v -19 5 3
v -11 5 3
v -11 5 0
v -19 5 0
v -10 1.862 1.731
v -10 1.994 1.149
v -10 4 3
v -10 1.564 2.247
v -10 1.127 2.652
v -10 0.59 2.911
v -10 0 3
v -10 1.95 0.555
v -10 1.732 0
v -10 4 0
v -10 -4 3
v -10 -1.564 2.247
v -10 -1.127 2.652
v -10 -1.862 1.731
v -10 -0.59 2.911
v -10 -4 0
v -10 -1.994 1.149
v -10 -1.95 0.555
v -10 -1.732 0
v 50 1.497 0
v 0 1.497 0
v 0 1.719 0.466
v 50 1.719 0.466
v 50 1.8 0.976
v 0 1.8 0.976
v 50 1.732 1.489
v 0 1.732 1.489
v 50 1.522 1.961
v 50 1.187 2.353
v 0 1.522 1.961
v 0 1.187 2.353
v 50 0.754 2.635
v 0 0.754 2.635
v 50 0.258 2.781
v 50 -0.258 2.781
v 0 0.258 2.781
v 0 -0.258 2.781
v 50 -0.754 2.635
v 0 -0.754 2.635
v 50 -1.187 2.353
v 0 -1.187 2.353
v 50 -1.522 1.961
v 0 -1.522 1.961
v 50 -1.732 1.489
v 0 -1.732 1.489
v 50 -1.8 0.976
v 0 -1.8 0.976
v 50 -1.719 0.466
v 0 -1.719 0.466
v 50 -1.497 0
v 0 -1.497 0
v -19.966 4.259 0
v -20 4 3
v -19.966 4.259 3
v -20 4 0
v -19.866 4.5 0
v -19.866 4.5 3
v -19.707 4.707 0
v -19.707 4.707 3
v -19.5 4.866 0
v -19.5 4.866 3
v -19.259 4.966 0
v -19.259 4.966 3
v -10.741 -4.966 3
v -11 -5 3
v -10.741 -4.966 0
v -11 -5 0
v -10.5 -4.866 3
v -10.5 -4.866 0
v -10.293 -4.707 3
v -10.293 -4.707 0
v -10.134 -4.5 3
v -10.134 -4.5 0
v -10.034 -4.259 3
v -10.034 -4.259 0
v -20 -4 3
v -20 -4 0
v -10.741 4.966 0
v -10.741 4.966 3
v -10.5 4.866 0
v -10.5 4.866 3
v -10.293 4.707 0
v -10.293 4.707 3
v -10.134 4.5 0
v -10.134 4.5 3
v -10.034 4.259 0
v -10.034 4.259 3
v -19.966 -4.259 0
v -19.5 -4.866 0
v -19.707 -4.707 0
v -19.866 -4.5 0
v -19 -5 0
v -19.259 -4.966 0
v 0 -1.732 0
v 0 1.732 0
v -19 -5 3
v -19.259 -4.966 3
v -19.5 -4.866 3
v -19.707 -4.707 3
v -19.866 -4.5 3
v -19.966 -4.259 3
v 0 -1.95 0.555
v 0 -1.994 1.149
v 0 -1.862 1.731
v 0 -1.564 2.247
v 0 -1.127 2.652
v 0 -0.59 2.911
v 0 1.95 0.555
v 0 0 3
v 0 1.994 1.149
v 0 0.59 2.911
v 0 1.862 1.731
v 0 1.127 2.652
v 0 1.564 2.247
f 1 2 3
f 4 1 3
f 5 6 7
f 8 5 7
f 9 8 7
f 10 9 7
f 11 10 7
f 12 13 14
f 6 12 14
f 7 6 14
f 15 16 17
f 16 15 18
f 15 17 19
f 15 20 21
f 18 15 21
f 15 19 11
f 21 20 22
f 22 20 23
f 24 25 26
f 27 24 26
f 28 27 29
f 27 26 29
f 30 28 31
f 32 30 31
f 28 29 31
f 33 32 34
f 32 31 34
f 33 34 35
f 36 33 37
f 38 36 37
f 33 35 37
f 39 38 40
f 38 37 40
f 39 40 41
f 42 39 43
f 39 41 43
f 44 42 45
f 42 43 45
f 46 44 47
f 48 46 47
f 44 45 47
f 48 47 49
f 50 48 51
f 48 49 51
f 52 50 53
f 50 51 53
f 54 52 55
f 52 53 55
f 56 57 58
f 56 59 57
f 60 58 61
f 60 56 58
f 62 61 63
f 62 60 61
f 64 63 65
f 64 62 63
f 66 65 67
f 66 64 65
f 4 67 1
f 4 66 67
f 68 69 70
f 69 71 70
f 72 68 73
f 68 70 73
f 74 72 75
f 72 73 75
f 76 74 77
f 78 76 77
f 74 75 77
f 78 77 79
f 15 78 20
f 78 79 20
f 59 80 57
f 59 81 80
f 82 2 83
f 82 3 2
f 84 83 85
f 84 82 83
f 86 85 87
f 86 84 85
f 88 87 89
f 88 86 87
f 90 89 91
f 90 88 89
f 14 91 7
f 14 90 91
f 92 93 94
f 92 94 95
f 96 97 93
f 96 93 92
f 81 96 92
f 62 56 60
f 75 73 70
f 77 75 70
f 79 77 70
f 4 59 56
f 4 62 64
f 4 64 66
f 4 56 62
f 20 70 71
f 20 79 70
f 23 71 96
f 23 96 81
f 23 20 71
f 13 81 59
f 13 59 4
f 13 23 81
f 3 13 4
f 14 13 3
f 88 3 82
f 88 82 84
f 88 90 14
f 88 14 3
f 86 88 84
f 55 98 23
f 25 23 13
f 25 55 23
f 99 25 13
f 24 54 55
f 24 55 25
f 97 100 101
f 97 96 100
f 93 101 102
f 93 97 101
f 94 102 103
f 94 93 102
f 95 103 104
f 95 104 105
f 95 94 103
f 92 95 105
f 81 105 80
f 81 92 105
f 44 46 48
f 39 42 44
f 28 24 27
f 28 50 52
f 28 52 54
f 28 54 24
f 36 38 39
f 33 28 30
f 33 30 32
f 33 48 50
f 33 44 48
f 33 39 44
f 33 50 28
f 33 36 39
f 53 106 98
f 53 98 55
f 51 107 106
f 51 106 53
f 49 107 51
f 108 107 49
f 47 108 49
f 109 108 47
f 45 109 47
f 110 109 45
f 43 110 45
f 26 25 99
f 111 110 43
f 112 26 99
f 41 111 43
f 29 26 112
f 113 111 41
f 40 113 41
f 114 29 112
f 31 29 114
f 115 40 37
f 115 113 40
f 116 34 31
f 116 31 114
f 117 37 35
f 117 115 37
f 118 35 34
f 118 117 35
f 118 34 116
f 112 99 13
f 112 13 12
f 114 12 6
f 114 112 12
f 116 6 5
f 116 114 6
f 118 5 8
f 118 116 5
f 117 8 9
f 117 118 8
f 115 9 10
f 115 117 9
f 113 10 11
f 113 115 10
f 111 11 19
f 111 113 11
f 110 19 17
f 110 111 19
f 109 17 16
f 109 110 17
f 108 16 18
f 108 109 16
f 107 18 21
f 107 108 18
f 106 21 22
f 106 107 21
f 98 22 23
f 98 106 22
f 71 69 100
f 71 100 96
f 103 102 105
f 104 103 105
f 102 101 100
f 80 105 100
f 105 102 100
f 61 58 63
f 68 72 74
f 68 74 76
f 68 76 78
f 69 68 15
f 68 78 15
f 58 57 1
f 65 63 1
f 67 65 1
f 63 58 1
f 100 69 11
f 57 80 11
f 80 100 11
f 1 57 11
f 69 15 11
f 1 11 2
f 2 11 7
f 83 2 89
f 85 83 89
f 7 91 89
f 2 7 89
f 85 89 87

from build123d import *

# Parameters (mm, degrees)
PAD_DEPTH    = 50
PAD001_DEPTH = 10
SKETCH004_W  = 10
SKETCH004_H  = 3
PAD002_DEPTH = 10
FILLET_R     = 1


with BuildPart() as part:
    # Sketch → Pad (new body)
    with BuildSketch(Plane.YZ):
        with BuildLine():
            ThreePointArc((1.496663, 0), (0, 2.8), (-1.496663, 0))
            Line((-1.496663, 0), (1.496663, 0))
        make_face()
    extrude(amount=PAD_DEPTH)

    # Sketch003 → Pad001 (join)
    with BuildSketch(Plane.YZ):
        with BuildLine():
            ThreePointArc((1.732051, 0), (0, 3), (-1.732051, 0))
            Line((-1.732051, 0), (1.732051, 0))
        make_face()
    extrude(amount=-PAD001_DEPTH)

    # Sketch004 (on DatumPlane) → Pad002 (join)
    with BuildSketch(Plane(origin=(-10, 0, 0), x_dir=(0, 1, 0), z_dir=(-1, 0, 0))):
        with Locations((0, -1.5)):
            Rectangle(SKETCH004_W, SKETCH004_H)
    extrude(amount=PAD002_DEPTH)

    # Fillet
    fillet_edges = [part.edges().sort_by_distance(p)[0] for p in [
        (-20, 5, 1.5),
        (-10, 5, 1.5),
        (-10, -5, 1.5),
        (-20, -5, 1.5),
    ]]
    fillet(fillet_edges, radius=FILLET_R)


solid = part.part
